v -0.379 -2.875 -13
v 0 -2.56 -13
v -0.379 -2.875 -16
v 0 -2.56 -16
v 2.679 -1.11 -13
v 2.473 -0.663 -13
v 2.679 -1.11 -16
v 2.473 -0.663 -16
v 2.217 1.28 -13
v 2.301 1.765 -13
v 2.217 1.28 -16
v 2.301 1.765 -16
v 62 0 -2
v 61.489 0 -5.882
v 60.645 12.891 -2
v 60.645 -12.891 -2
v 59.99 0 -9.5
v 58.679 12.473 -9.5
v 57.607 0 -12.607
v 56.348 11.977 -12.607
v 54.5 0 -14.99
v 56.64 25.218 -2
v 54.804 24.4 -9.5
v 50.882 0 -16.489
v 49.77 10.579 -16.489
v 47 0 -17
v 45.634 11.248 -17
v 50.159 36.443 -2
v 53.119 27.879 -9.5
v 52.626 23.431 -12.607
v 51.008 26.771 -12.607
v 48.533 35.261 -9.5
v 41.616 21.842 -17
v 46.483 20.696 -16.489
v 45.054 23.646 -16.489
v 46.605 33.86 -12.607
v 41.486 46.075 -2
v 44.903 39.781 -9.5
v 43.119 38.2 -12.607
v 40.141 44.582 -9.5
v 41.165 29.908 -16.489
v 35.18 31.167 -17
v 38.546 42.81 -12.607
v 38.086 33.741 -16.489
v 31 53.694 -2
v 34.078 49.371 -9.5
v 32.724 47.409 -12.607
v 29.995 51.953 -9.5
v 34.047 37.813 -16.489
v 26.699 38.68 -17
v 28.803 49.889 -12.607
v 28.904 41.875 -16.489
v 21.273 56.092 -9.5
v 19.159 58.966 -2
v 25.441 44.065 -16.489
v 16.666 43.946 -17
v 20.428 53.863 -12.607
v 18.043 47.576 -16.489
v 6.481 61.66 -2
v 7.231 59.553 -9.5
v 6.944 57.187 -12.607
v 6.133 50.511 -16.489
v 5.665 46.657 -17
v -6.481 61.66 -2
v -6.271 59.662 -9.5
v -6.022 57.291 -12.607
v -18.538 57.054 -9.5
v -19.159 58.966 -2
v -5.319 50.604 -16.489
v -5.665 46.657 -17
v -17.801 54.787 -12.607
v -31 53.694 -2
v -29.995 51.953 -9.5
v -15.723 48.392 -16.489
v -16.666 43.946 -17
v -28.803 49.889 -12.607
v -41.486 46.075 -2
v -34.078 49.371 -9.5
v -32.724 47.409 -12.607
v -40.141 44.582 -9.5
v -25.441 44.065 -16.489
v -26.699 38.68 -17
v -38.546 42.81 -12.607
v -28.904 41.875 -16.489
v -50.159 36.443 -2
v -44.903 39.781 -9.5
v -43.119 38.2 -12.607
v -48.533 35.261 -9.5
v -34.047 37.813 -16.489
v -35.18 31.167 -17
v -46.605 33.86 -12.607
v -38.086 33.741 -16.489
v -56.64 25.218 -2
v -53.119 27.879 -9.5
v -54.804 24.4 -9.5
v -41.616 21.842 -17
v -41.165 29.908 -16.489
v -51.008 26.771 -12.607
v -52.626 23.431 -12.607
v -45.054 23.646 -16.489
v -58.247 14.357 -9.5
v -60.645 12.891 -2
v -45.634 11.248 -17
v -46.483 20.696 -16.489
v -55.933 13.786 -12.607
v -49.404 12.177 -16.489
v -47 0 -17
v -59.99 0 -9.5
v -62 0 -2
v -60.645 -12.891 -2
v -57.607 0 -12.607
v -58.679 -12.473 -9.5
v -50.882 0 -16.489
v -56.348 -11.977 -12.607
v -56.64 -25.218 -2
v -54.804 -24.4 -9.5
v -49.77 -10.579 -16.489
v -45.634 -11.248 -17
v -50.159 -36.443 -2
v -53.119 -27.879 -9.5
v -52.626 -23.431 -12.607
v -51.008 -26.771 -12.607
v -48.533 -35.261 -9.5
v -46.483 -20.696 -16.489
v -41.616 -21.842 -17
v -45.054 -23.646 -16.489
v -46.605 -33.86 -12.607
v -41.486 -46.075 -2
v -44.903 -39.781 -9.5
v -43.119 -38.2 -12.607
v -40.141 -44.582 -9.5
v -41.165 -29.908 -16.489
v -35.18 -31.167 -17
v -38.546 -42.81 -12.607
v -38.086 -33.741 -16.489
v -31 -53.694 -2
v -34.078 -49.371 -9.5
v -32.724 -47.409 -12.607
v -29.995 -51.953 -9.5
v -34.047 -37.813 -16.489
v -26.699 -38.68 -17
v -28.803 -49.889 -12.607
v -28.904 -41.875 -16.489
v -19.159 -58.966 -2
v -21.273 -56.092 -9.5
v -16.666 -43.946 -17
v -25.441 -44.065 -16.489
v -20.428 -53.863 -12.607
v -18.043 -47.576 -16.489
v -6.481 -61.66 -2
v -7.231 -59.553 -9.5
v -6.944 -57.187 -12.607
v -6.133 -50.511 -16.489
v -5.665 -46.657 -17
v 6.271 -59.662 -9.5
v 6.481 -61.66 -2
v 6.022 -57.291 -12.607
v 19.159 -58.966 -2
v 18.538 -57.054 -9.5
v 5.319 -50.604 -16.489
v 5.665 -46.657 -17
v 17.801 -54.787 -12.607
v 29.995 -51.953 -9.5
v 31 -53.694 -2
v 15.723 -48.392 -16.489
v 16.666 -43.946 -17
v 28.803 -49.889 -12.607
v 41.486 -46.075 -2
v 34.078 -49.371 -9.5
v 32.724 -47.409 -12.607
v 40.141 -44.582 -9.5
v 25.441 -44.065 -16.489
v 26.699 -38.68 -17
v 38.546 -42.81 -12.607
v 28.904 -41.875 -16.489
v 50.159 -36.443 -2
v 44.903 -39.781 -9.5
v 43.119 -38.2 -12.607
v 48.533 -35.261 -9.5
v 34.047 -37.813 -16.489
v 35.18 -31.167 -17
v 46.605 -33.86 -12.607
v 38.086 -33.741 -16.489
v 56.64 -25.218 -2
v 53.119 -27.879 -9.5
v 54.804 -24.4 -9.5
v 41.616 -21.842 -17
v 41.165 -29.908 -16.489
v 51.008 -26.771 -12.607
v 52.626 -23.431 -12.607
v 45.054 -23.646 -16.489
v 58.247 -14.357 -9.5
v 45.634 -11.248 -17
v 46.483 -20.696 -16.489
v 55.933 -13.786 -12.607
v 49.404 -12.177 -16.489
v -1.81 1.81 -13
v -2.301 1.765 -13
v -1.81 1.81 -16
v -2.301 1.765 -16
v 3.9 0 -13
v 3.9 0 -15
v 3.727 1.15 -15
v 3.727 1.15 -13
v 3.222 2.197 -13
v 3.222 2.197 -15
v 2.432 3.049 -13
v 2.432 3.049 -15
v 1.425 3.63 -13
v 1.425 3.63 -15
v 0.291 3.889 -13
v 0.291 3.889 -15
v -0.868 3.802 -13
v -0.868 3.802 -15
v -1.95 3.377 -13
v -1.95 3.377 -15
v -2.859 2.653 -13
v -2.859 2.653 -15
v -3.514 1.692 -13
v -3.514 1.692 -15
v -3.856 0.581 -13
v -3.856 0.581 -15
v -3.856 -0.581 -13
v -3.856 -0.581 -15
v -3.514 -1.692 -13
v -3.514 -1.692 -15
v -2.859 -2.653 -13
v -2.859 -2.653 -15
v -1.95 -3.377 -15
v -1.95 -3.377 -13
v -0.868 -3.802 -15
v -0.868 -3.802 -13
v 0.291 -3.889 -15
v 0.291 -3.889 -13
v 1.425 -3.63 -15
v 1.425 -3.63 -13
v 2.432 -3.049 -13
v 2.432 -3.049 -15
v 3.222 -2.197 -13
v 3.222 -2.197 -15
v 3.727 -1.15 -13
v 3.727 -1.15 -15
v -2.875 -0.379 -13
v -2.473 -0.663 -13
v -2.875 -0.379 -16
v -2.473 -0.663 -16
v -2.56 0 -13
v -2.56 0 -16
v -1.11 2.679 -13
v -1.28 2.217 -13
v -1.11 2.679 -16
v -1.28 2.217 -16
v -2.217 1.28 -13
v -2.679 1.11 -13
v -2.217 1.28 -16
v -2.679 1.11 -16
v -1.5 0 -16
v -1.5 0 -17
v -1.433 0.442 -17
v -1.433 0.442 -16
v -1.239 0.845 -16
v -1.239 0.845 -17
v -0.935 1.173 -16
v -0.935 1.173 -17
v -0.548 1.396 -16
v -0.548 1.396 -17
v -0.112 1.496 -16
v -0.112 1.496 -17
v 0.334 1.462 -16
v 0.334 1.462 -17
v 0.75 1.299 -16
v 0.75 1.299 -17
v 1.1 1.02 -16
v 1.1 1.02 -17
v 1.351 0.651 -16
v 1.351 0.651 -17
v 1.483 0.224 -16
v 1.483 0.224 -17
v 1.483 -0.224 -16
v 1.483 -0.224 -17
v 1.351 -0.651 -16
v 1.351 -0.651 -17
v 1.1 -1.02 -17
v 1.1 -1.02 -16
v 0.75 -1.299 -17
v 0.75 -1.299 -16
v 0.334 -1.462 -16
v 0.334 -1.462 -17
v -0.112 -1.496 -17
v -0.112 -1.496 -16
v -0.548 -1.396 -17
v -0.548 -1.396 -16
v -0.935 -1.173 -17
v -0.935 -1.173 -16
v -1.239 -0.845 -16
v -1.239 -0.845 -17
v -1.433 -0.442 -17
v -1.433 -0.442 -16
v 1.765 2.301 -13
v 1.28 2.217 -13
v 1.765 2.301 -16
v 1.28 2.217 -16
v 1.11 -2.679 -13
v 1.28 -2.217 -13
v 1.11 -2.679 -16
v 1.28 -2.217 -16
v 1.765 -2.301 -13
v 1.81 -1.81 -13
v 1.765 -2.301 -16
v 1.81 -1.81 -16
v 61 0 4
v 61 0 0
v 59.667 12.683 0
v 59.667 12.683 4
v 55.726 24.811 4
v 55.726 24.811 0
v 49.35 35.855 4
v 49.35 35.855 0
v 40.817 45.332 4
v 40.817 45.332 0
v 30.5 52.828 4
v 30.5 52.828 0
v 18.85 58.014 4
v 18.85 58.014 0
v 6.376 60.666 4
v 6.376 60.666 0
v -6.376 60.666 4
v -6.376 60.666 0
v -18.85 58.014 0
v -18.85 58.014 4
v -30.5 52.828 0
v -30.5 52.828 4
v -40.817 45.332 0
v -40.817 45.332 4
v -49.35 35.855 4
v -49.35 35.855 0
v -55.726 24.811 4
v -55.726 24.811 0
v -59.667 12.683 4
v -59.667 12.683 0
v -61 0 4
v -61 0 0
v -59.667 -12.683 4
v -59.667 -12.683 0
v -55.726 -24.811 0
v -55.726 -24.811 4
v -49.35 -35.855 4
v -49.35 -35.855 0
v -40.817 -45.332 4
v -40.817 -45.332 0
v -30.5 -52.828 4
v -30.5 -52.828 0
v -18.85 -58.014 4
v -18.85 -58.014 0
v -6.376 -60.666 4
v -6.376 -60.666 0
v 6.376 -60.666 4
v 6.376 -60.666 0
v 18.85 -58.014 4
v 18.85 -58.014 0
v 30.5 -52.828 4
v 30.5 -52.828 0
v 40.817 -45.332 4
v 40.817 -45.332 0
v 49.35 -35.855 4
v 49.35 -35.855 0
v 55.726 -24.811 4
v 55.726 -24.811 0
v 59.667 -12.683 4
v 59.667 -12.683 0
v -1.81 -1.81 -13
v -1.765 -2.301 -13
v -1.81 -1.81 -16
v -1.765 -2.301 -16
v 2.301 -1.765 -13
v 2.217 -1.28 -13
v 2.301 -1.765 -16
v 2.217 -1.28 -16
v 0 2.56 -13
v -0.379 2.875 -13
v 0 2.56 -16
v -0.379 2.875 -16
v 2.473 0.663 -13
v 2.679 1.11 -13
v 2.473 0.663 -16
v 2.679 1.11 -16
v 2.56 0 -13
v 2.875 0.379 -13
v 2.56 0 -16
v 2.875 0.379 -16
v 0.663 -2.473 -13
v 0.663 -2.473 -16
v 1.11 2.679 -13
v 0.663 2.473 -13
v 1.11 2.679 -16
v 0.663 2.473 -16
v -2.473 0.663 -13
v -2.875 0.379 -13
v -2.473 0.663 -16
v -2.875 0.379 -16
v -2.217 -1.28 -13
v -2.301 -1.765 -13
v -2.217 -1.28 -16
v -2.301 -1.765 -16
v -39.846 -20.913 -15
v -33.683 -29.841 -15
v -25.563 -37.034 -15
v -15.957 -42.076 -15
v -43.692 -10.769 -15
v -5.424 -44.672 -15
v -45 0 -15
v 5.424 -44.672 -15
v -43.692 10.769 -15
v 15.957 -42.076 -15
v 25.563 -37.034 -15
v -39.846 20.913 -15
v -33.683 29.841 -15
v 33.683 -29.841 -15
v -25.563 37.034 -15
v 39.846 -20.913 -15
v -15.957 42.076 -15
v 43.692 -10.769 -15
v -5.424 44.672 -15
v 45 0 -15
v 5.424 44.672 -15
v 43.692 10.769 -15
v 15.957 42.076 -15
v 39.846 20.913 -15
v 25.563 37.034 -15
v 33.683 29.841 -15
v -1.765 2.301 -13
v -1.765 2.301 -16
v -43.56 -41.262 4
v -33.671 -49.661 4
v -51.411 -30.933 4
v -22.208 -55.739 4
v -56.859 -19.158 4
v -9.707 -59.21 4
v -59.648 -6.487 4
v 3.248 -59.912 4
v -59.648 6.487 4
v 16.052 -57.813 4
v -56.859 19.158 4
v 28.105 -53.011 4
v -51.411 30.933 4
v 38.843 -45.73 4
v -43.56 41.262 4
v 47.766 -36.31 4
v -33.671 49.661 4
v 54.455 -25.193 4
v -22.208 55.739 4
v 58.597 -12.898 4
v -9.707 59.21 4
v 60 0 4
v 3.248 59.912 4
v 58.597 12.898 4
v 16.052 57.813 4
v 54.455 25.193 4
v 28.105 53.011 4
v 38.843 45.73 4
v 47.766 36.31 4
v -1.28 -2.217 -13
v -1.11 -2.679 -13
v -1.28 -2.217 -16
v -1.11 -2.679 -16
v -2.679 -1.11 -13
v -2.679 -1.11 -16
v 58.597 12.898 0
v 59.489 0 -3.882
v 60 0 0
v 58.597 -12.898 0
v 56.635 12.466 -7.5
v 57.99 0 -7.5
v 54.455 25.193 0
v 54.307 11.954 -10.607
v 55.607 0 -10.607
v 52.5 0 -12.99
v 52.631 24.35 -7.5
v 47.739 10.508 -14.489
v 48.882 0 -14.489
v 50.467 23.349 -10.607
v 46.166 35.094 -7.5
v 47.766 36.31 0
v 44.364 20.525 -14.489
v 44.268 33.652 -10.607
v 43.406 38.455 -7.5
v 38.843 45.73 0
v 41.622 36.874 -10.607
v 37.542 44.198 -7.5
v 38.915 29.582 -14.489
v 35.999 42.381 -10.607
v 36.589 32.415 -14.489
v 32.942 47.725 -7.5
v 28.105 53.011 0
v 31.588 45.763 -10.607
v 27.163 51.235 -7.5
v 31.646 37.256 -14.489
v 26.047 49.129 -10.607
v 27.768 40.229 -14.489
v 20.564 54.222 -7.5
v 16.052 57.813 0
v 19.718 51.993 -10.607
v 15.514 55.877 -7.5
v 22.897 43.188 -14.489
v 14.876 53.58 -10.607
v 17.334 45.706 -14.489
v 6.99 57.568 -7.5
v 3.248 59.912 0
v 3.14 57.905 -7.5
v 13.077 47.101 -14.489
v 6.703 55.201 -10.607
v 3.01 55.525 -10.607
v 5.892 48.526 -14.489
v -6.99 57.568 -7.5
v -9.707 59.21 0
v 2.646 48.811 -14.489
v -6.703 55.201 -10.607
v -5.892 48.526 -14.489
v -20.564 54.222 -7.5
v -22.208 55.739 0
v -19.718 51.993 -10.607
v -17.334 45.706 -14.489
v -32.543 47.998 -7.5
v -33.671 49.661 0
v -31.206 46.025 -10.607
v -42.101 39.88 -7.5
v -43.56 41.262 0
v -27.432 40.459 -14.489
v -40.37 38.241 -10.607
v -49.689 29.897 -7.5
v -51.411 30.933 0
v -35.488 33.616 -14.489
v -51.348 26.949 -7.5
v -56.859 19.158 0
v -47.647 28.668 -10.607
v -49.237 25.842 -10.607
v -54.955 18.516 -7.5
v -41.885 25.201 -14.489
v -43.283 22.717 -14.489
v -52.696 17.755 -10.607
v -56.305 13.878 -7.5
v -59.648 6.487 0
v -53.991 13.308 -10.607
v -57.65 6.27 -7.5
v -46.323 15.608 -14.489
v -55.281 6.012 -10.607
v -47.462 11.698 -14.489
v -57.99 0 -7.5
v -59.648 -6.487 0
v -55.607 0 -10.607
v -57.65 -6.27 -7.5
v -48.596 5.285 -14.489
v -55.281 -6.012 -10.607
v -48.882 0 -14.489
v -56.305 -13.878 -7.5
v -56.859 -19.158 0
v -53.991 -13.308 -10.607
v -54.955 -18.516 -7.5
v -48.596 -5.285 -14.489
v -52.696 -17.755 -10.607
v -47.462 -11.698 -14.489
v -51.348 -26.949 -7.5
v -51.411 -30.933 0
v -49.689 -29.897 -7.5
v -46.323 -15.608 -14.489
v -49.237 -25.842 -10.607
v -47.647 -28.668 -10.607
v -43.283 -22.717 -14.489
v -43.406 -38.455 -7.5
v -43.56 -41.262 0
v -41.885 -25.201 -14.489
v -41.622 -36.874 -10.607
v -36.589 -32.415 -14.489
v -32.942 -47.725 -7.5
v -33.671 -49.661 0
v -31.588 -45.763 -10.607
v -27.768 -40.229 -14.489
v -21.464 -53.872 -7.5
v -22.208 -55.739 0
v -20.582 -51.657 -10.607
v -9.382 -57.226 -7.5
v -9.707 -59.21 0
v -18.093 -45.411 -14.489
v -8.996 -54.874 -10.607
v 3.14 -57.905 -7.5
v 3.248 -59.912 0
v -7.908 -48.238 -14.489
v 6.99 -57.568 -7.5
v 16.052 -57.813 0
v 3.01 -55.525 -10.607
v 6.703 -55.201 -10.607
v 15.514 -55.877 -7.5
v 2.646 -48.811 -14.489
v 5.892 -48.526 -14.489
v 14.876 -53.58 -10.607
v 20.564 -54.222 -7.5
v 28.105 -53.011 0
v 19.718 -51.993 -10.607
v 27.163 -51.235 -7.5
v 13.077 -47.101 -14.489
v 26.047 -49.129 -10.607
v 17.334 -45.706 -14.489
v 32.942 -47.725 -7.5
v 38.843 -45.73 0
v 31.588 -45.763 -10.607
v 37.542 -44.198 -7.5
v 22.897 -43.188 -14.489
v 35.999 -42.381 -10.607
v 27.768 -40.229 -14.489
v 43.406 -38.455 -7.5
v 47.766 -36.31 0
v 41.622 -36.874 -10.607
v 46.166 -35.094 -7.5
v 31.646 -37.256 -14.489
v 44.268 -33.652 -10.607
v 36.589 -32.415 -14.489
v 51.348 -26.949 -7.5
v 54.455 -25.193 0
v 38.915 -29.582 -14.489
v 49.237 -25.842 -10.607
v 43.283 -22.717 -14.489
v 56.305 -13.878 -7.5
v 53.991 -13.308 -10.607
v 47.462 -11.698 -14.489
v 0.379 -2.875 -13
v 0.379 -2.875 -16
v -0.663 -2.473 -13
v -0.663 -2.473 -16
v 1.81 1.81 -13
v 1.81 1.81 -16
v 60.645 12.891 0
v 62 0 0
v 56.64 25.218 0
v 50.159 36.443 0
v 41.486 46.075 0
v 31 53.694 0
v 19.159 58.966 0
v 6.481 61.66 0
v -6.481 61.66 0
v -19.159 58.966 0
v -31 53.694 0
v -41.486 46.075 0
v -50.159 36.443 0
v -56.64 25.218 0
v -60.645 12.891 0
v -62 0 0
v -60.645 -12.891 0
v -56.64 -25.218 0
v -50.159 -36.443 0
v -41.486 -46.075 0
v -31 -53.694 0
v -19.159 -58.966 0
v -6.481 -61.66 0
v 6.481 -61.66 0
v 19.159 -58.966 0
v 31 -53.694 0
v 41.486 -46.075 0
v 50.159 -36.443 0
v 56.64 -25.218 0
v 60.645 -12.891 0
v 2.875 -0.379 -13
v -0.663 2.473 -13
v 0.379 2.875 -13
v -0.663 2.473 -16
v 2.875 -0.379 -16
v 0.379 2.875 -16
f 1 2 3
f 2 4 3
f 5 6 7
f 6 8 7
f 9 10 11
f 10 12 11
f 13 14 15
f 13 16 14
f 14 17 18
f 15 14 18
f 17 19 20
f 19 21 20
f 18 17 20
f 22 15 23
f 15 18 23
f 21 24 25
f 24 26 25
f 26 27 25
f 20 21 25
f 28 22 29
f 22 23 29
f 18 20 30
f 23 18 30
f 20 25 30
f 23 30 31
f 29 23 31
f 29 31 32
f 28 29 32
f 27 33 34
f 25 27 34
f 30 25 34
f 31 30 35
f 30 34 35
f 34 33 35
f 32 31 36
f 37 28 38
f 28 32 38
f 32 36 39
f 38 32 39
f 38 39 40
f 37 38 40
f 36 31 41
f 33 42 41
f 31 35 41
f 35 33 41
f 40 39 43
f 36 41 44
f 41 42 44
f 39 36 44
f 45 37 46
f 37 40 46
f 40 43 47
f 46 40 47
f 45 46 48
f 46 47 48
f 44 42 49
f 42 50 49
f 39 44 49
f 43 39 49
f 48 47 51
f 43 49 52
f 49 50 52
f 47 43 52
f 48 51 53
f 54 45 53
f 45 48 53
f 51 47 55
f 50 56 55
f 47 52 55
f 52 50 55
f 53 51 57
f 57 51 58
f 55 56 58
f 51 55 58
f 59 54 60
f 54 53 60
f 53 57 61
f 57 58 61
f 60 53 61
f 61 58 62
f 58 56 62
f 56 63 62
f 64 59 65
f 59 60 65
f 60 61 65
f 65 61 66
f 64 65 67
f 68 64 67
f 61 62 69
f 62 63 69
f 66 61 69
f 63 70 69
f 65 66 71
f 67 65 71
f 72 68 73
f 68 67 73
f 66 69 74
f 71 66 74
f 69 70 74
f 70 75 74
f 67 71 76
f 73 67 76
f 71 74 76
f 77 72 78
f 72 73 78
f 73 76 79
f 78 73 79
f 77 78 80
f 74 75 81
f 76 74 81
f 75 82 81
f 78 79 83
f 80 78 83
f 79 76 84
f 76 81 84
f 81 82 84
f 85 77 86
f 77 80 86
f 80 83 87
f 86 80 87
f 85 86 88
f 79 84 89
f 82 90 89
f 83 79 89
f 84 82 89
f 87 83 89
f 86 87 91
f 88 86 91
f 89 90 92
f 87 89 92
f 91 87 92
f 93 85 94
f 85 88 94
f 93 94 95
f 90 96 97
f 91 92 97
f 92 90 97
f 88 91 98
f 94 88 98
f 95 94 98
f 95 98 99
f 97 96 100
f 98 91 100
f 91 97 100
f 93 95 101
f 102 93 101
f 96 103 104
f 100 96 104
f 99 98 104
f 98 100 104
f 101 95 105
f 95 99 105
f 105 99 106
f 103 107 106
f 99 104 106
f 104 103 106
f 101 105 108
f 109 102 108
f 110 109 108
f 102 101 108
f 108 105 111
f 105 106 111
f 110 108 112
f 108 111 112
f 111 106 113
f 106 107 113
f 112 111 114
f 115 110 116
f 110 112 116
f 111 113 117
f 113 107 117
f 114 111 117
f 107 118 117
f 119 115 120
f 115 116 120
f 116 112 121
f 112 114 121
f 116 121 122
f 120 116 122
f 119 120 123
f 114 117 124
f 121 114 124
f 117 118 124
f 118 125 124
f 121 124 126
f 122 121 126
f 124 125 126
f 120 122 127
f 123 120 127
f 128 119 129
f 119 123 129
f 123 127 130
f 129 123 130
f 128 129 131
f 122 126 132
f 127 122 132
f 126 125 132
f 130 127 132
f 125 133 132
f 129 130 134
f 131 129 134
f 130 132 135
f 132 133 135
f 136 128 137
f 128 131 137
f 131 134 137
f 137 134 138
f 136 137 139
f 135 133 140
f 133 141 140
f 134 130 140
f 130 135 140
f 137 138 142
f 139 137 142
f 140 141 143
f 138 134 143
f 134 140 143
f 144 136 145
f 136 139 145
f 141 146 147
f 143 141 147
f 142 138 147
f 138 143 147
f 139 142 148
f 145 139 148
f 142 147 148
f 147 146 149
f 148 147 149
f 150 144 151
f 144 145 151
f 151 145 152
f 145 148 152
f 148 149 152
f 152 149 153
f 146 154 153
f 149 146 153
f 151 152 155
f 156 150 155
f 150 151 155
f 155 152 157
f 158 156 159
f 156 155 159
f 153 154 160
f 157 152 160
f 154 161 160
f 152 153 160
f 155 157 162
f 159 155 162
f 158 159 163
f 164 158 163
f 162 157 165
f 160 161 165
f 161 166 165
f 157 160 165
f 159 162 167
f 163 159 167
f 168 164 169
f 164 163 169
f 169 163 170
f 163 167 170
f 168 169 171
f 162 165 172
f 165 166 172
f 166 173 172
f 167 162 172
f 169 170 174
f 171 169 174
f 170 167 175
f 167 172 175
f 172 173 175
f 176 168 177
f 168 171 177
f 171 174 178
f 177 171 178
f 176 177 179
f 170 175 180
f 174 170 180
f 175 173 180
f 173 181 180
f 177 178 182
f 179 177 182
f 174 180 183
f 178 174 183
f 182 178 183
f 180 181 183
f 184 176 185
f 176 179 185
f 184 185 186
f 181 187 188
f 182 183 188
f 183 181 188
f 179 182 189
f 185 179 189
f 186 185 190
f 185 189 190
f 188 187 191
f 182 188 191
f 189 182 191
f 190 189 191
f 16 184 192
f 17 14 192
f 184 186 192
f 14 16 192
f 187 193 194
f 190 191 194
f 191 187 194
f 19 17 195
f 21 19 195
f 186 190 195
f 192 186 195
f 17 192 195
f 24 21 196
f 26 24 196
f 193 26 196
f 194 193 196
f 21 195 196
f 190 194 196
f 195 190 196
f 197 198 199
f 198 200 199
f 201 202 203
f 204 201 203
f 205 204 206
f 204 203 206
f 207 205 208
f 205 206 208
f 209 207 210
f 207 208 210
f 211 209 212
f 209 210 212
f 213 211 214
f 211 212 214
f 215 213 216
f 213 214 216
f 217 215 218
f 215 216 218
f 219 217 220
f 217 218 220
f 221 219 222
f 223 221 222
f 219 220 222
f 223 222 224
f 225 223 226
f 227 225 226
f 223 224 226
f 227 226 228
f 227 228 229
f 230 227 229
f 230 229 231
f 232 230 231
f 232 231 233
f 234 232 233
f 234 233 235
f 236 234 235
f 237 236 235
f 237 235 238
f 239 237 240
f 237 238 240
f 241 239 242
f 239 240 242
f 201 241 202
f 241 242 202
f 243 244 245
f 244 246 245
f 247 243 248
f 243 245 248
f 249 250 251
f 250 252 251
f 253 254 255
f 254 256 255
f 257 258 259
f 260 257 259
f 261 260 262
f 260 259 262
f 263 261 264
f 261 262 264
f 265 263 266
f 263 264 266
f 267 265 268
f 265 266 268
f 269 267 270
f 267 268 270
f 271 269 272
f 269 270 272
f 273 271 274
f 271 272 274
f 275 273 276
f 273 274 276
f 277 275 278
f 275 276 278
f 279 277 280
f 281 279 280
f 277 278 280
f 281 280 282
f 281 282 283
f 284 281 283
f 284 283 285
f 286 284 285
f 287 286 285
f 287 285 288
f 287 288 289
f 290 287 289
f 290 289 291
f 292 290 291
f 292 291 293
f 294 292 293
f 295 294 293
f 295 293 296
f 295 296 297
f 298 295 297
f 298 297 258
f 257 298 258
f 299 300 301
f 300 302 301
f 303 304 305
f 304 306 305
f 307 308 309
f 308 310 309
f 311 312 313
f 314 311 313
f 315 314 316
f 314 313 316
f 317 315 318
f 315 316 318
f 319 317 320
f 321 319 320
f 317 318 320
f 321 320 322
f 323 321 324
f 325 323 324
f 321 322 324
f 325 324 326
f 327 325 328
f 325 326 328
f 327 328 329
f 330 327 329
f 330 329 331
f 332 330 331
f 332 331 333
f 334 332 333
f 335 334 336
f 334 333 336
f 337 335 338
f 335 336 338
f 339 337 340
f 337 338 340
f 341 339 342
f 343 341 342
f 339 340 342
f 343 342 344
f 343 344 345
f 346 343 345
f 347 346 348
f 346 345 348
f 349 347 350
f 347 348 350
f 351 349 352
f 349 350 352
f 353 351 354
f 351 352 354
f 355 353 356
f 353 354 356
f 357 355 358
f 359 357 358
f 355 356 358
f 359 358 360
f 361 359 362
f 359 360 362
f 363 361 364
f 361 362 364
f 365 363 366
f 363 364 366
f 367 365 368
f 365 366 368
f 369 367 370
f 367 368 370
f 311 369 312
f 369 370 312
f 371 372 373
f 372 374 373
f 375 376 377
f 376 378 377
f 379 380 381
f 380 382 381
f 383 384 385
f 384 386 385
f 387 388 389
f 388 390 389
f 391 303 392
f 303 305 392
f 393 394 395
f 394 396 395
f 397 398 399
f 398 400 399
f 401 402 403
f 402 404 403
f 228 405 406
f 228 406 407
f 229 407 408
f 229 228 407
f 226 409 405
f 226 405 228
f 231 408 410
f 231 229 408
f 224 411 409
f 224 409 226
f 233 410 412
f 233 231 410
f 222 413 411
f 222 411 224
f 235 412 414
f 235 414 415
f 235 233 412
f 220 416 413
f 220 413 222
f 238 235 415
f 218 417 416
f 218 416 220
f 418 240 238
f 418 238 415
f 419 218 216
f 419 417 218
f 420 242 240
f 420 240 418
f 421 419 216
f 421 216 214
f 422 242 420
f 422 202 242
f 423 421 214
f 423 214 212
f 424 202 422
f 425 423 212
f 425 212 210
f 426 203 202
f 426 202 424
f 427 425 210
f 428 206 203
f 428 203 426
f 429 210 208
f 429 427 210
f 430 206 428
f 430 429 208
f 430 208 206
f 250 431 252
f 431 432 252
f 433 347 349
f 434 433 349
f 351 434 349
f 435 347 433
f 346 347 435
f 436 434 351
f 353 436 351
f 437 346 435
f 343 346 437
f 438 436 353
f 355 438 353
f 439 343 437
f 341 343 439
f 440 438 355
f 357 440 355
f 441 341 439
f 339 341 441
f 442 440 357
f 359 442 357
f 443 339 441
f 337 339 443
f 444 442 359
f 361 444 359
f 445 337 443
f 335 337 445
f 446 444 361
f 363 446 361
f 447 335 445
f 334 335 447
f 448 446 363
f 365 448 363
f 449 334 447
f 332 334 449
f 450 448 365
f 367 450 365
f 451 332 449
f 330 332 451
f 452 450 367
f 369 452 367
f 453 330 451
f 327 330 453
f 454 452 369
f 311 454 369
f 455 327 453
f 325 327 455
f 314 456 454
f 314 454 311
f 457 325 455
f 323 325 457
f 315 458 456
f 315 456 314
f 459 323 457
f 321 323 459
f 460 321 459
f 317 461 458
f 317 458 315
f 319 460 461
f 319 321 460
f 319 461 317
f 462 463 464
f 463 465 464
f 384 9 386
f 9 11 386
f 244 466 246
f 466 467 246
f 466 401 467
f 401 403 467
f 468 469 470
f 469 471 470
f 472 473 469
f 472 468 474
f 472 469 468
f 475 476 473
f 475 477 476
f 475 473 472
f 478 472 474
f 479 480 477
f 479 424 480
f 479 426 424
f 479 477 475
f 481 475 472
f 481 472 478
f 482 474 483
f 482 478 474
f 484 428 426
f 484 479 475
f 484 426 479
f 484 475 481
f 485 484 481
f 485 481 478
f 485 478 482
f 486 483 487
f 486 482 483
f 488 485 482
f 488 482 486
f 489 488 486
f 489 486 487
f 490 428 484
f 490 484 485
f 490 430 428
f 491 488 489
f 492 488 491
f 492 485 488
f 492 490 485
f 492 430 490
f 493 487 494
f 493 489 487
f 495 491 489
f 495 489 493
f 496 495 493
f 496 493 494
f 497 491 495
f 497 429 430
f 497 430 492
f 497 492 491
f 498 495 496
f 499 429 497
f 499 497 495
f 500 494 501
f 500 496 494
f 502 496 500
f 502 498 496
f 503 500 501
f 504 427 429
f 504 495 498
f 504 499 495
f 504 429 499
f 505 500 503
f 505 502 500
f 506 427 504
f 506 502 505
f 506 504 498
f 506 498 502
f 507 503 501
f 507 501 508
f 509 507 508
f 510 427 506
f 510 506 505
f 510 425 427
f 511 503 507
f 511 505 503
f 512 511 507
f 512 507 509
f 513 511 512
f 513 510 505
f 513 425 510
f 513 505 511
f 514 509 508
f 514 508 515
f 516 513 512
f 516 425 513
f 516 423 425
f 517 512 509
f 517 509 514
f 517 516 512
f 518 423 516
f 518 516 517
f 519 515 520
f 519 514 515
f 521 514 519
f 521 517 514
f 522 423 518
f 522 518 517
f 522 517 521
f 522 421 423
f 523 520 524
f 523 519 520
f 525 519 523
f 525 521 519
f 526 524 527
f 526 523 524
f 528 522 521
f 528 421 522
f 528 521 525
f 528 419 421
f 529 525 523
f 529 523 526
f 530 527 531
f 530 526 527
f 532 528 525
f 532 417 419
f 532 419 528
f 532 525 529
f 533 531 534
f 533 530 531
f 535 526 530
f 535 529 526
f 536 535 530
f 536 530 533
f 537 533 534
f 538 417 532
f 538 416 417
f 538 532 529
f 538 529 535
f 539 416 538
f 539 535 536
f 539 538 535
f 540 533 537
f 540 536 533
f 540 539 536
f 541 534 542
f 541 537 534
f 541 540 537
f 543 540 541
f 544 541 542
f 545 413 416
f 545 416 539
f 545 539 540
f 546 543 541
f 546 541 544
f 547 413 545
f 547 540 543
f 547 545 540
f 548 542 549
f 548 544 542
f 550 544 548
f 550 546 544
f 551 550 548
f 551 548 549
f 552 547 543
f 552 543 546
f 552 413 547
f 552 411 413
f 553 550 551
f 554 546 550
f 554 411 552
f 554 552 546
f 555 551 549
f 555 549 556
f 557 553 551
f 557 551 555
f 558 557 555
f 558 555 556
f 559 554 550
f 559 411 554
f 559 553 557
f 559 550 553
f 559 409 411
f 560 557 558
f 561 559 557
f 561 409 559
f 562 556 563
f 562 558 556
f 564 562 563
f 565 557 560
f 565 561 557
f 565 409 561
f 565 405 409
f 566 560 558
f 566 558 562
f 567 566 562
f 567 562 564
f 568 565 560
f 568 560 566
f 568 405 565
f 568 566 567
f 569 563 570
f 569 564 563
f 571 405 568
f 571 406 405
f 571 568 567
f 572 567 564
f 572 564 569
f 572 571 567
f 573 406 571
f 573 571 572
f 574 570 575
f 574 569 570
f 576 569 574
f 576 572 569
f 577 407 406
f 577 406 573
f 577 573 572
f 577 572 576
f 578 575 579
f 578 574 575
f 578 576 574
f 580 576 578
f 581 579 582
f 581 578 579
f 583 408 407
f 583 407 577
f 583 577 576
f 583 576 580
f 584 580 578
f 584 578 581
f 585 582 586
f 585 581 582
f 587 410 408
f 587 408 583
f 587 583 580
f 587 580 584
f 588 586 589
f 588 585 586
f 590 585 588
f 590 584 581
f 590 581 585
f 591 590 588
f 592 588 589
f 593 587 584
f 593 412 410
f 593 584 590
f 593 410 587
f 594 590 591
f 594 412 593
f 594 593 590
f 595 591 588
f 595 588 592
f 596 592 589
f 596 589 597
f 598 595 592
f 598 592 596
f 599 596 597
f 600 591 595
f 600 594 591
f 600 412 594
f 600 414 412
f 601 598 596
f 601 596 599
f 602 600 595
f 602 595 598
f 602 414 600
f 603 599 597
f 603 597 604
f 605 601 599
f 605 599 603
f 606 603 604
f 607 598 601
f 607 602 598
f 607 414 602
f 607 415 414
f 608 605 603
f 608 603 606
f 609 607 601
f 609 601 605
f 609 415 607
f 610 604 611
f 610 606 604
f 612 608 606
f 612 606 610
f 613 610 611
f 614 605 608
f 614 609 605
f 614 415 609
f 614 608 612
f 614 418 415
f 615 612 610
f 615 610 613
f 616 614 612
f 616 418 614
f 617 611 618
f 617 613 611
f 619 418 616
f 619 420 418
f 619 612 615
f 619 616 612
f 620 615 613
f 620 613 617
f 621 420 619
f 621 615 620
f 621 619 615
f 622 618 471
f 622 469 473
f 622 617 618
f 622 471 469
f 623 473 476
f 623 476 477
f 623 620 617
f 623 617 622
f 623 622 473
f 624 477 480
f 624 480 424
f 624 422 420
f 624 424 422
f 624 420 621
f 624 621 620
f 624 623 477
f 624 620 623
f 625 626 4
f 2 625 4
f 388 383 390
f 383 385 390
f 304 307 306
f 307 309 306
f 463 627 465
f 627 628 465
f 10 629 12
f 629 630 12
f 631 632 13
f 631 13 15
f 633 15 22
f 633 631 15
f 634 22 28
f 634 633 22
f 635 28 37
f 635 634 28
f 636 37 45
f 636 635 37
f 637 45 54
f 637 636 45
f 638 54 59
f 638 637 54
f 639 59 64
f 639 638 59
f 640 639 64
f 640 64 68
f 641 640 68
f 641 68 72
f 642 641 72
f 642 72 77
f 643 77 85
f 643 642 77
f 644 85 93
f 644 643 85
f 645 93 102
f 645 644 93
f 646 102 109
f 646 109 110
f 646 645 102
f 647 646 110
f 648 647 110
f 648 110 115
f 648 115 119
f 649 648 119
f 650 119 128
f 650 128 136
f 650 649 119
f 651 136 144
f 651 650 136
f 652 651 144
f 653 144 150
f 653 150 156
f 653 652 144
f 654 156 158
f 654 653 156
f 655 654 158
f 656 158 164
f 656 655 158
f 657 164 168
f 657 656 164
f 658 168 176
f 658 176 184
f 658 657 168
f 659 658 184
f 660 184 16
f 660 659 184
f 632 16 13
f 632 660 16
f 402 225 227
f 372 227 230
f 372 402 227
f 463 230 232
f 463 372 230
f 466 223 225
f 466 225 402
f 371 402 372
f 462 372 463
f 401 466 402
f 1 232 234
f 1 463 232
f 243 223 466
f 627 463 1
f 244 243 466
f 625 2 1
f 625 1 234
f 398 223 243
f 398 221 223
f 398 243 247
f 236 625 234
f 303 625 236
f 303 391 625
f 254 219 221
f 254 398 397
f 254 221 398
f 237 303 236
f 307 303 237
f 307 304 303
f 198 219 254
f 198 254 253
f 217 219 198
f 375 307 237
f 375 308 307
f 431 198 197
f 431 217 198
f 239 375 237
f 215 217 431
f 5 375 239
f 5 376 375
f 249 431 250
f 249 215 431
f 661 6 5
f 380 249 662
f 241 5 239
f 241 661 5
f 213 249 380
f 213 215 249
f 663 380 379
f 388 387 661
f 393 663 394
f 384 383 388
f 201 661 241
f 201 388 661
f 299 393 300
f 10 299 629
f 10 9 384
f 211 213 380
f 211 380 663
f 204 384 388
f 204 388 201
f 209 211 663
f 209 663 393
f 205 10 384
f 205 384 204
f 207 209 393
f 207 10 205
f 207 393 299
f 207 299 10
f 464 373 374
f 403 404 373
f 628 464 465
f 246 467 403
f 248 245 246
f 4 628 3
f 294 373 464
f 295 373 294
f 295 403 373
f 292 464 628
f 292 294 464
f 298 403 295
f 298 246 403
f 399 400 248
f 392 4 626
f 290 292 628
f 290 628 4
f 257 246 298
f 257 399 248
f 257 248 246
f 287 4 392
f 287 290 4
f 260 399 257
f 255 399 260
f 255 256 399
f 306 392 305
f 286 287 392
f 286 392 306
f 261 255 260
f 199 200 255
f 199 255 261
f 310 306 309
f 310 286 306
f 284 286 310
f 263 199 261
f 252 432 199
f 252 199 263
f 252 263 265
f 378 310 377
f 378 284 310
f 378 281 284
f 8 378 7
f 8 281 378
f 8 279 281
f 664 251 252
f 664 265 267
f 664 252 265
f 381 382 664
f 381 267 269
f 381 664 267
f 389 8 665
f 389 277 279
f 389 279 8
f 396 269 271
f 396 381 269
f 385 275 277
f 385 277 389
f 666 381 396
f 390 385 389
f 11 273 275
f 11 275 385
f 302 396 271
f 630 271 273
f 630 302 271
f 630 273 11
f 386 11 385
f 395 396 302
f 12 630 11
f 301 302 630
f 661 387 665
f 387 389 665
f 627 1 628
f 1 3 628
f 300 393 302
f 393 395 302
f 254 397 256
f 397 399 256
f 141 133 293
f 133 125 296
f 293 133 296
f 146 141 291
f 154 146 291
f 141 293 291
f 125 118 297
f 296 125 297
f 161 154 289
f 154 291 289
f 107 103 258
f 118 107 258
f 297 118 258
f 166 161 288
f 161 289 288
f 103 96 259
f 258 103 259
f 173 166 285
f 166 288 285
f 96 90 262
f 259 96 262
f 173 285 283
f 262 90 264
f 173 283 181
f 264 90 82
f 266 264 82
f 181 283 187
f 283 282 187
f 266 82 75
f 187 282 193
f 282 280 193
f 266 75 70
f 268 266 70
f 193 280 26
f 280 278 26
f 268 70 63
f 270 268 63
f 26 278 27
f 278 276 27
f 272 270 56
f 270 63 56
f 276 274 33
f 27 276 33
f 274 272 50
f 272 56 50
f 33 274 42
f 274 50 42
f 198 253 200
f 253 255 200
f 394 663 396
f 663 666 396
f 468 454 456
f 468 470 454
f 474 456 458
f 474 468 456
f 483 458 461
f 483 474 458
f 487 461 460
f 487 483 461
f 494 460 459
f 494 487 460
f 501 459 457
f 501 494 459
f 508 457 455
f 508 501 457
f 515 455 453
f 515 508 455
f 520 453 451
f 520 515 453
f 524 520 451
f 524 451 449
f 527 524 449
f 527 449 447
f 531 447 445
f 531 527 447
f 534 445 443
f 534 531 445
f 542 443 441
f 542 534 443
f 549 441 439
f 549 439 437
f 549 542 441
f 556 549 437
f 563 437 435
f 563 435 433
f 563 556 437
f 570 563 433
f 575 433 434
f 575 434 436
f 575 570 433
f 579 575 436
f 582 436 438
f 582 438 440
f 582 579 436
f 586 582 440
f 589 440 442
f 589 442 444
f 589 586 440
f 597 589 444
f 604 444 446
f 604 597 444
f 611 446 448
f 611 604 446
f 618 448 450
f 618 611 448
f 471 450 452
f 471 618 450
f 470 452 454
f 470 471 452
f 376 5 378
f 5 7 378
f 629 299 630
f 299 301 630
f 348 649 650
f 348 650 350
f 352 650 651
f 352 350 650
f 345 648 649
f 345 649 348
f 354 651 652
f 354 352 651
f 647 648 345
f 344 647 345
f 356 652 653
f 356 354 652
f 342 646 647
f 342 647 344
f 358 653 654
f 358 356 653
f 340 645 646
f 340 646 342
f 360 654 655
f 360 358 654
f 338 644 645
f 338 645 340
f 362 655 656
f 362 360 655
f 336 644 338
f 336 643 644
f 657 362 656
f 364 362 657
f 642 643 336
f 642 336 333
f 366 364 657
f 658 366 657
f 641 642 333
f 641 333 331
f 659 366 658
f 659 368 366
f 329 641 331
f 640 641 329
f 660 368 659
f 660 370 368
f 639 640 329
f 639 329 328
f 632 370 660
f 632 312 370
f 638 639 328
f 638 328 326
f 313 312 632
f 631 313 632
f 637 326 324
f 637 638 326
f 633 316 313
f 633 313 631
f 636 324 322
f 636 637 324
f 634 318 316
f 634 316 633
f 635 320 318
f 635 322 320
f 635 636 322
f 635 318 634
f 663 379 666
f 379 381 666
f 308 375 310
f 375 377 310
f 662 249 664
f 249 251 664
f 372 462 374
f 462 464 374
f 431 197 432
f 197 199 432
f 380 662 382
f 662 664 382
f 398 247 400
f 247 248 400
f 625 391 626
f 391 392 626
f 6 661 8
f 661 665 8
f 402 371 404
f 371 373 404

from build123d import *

# Parameters (mm, degrees)
F0_R     = 62
F1_DEPTH = 17
F2_R     = 60
F3_DEPTH = 15
F4_R     = 14.99999
F5_R     = 61
F5_R_2   = 60
F6_DEPTH = 4
F7_R     = 3.9
F8_DEPTH = 2
F9_DEPTH = 1
F10_D    = 3


# Not quite as in the source:
# - a fillet or chamfer is up to 0.001 mm smaller than in the source, because OpenCascade refuses the exact size


with BuildPart() as f1:
    # F0 (on Top) → F1 (new body)
    with BuildSketch(Plane.XY):
        Circle(F0_R)
    extrude(amount=-F1_DEPTH)

    # F2 (on face) → F3 (cut)
    with BuildSketch(Plane.XY):
        Circle(F2_R)
    extrude(amount=-F3_DEPTH, mode=Mode.SUBTRACT)

    # F4 (radius 15 in the source; OpenCascade refuses exactly that, so slightly less here)
    f4_edges = [f1.edges().sort_by_distance(p)[0] for p in [
        (-60, 0, -15),
        (-62, 0, -17),
    ]]
    fillet(f4_edges, radius=F4_R)

    # F5 (on face) → F6 (join)
    with BuildSketch(Plane.XY):
        Circle(F5_R)
        Circle(F5_R_2, mode=Mode.SUBTRACT)
    extrude(amount=F6_DEPTH)

    # F7 (on face) → F8 (join)
    with BuildSketch(Plane.XY.offset(-15)):
        Circle(F7_R)
        with BuildLine():
            ThreePointArc((2.6792506443, 1.1097819539), (2.8011848962, 0.7505752308), (2.875190098, 0.3785259574))
            ThreePointArc((2.875190098, 0.3785259574), (2.8937908774, 0.1896690748), (2.9, 0))
            ThreePointArc((2.9, 0), (2.8937908774, -0.1896690748), (2.875190098, -0.3785259574))
            ThreePointArc((2.875190098, -0.3785259574), (2.8011848962, -0.7505752308), (2.6792506443, -1.1097819539))
            ThreePointArc((2.6792506443, -1.1097819539), (2.511473671, -1.45), (2.3007246868, -1.7654081441))
            ThreePointArc((2.3007246868, -1.7654081441), (2.0506096654, -2.0506096654), (1.7654081441, -2.3007246868))
            ThreePointArc((1.7654081441, -2.3007246868), (1.45, -2.511473671), (1.1097819539, -2.6792506443))
            ThreePointArc((1.1097819539, -2.6792506443), (0.7505752308, -2.8011848962), (0.3785259574, -2.875190098))
            ThreePointArc((0.3785259574, -2.875190098), (0, -2.9), (-0.3785259574, -2.875190098))
            ThreePointArc((-0.3785259574, -2.875190098), (-0.7505752308, -2.8011848962), (-1.1097819539, -2.6792506443))
            ThreePointArc((-1.1097819539, -2.6792506443), (-1.45, -2.511473671), (-1.7654081441, -2.3007246868))
            ThreePointArc((-1.7654081441, -2.3007246868), (-2.0506096654, -2.0506096654), (-2.3007246868, -1.7654081441))
            ThreePointArc((-2.3007246868, -1.7654081441), (-2.511473671, -1.45), (-2.6792506443, -1.1097819539))
            ThreePointArc((-2.6792506443, -1.1097819539), (-2.8011848962, -0.7505752308), (-2.875190098, -0.3785259574))
            ThreePointArc((-2.875190098, -0.3785259574), (-2.9, 0), (-2.875190098, 0.3785259574))
            ThreePointArc((-2.875190098, 0.3785259574), (-2.8011848962, 0.7505752308), (-2.6792506443, 1.1097819539))
            ThreePointArc((-2.6792506443, 1.1097819539), (-2.511473671, 1.45), (-2.3007246868, 1.7654081441))
            ThreePointArc((-2.3007246868, 1.7654081441), (-2.0506096654, 2.0506096654), (-1.7654081441, 2.3007246868))
            ThreePointArc((-1.7654081441, 2.3007246868), (-1.45, 2.511473671), (-1.1097819539, 2.6792506443))
            ThreePointArc((-1.1097819539, 2.6792506443), (-0.7505752308, 2.8011848962), (-0.3785259574, 2.875190098))
            ThreePointArc((-0.3785259574, 2.875190098), (0, 2.9), (0.3785259574, 2.875190098))
            ThreePointArc((0.3785259574, 2.875190098), (0.7505752308, 2.8011848962), (1.1097819539, 2.6792506443))
            ThreePointArc((1.1097819539, 2.6792506443), (1.45, 2.511473671), (1.7654081441, 2.3007246868))
            ThreePointArc((1.7654081441, 2.3007246868), (2.0506096654, 2.0506096654), (2.3007246868, 1.7654081441))
            ThreePointArc((2.3007246868, 1.7654081441), (2.511473671, 1.45), (2.6792506443, 1.1097819539))
        make_face(mode=Mode.SUBTRACT)
        with BuildLine():
            Line((-2.6792506443, 1.1097819539), (-2.2170250337, 1.28))
            Line((-2.2170250337, 1.28), (-2.3007246868, 1.7654081441))
            ThreePointArc((-2.3007246868, 1.7654081441), (-2.511473671, 1.45), (-2.6792506443, 1.1097819539))
        make_face()
        with BuildLine():
            Line((-2.3007246868, 1.7654081441), (-1.8101933598, 1.8101933598))
            Line((-1.8101933598, 1.8101933598), (-1.7654081441, 2.3007246868))
            ThreePointArc((-1.7654081441, 2.3007246868), (-2.0506096654, 2.0506096654), (-2.3007246868, 1.7654081441))
        make_face()
        with BuildLine():
            Line((-1.7654081441, 2.3007246868), (-1.28, 2.2170250337))
            Line((-1.28, 2.2170250337), (-1.1097819539, 2.6792506443))
            ThreePointArc((-1.1097819539, 2.6792506443), (-1.45, 2.511473671), (-1.7654081441, 2.3007246868))
        make_face()
        with BuildLine():
            Line((-1.1097819539, 2.6792506443), (-0.6625767555, 2.4727701153))
            Line((-0.6625767555, 2.4727701153), (-0.3785259574, 2.875190098))
            ThreePointArc((-0.3785259574, 2.875190098), (-0.7505752308, 2.8011848962), (-1.1097819539, 2.6792506443))
        make_face()
        with BuildLine():
            Line((-0.3785259574, 2.875190098), (0, 2.56))
            Line((0, 2.56), (0.3785259574, 2.875190098))
            ThreePointArc((0.3785259574, 2.875190098), (0, 2.9), (-0.3785259574, 2.875190098))
        make_face()
        with BuildLine():
            Line((0.3785259574, 2.875190098), (0.6625767555, 2.4727701153))
            Line((0.6625767555, 2.4727701153), (1.1097819539, 2.6792506443))
            ThreePointArc((1.1097819539, 2.6792506443), (0.7505752308, 2.8011848962), (0.3785259574, 2.875190098))
        make_face()
        with BuildLine():
            Line((1.1097819539, 2.6792506443), (1.28, 2.2170250337))
            Line((1.28, 2.2170250337), (1.7654081441, 2.3007246868))
            ThreePointArc((1.7654081441, 2.3007246868), (1.45, 2.511473671), (1.1097819539, 2.6792506443))
        make_face()
        with BuildLine():
            Line((1.7654081441, 2.3007246868), (1.8101933598, 1.8101933598))
            Line((1.8101933598, 1.8101933598), (2.3007246868, 1.7654081441))
            ThreePointArc((2.3007246868, 1.7654081441), (2.0506096654, 2.0506096654), (1.7654081441, 2.3007246868))
        make_face()
        with BuildLine():
            Line((2.3007246868, 1.7654081441), (2.2170250337, 1.28))
            Line((2.2170250337, 1.28), (2.6792506443, 1.1097819539))
            ThreePointArc((2.6792506443, 1.1097819539), (2.511473671, 1.45), (2.3007246868, 1.7654081441))
        make_face()
        with BuildLine():
            Line((2.6792506443, 1.1097819539), (2.4727701153, 0.6625767555))
            Line((2.4727701153, 0.6625767555), (2.875190098, 0.3785259574))
            ThreePointArc((2.875190098, 0.3785259574), (2.8011848962, 0.7505752308), (2.6792506443, 1.1097819539))
        make_face()
        with BuildLine():
            ThreePointArc((2.9, 0), (2.8937908774, 0.1896690748), (2.875190098, 0.3785259574))
            Line((2.875190098, 0.3785259574), (2.56, 0))
            Line((2.56, 0), (2.875190098, -0.3785259574))
            ThreePointArc((2.875190098, -0.3785259574), (2.8937908774, -0.1896690748), (2.9, 0))
        make_face()
        with BuildLine():
            Line((2.875190098, -0.3785259574), (2.4727701153, -0.6625767555))
            Line((2.4727701153, -0.6625767555), (2.6792506443, -1.1097819539))
            ThreePointArc((2.6792506443, -1.1097819539), (2.8011848962, -0.7505752308), (2.875190098, -0.3785259574))
        make_face()
        with BuildLine():
            Line((2.6792506443, -1.1097819539), (2.2170250337, -1.28))
            Line((2.2170250337, -1.28), (2.3007246868, -1.7654081441))
            ThreePointArc((2.3007246868, -1.7654081441), (2.511473671, -1.45), (2.6792506443, -1.1097819539))
        make_face()
        with BuildLine():
            Line((2.3007246868, -1.7654081441), (1.8101933598, -1.8101933598))
            Line((1.8101933598, -1.8101933598), (1.7654081441, -2.3007246868))
            ThreePointArc((1.7654081441, -2.3007246868), (2.0506096654, -2.0506096654), (2.3007246868, -1.7654081441))
        make_face()
        with BuildLine():
            Line((1.7654081441, -2.3007246868), (1.28, -2.2170250337))
            Line((1.28, -2.2170250337), (1.1097819539, -2.6792506443))
            ThreePointArc((1.1097819539, -2.6792506443), (1.45, -2.511473671), (1.7654081441, -2.3007246868))
        make_face()
        with BuildLine():
            Line((-2.875190098, 0.3785259574), (-2.4727701153, 0.6625767555))
            Line((-2.4727701153, 0.6625767555), (-2.6792506443, 1.1097819539))
            ThreePointArc((-2.6792506443, 1.1097819539), (-2.8011848962, 0.7505752308), (-2.875190098, 0.3785259574))
        make_face()
        with BuildLine():
            Line((-2.875190098, -0.3785259574), (-2.56, 0))
            Line((-2.56, 0), (-2.875190098, 0.3785259574))
            ThreePointArc((-2.875190098, 0.3785259574), (-2.9, 0), (-2.875190098, -0.3785259574))
        make_face()
        with BuildLine():
            Line((-2.6792506443, -1.1097819539), (-2.4727701153, -0.6625767555))
            Line((-2.4727701153, -0.6625767555), (-2.875190098, -0.3785259574))
            ThreePointArc((-2.875190098, -0.3785259574), (-2.8011848962, -0.7505752308), (-2.6792506443, -1.1097819539))
        make_face()
        with BuildLine():
            Line((-2.3007246868, -1.7654081441), (-2.2170250337, -1.28))
            Line((-2.2170250337, -1.28), (-2.6792506443, -1.1097819539))
            ThreePointArc((-2.6792506443, -1.1097819539), (-2.511473671, -1.45), (-2.3007246868, -1.7654081441))
        make_face()
        with BuildLine():
            Line((-1.7654081441, -2.3007246868), (-1.8101933598, -1.8101933598))
            Line((-1.8101933598, -1.8101933598), (-2.3007246868, -1.7654081441))
            ThreePointArc((-2.3007246868, -1.7654081441), (-2.0506096654, -2.0506096654), (-1.7654081441, -2.3007246868))
        make_face()
        with BuildLine():
            Line((-1.1097819539, -2.6792506443), (-1.28, -2.2170250337))
            Line((-1.28, -2.2170250337), (-1.7654081441, -2.3007246868))
            ThreePointArc((-1.7654081441, -2.3007246868), (-1.45, -2.511473671), (-1.1097819539, -2.6792506443))
        make_face()
        with BuildLine():
            Line((-0.3785259574, -2.875190098), (-0.6625767555, -2.4727701153))
            Line((-0.6625767555, -2.4727701153), (-1.1097819539, -2.6792506443))
            ThreePointArc((-1.1097819539, -2.6792506443), (-0.7505752308, -2.8011848962), (-0.3785259574, -2.875190098))
        make_face()
        with BuildLine():
            Line((0.3785259574, -2.875190098), (0, -2.56))
            Line((0, -2.56), (-0.3785259574, -2.875190098))
            ThreePointArc((-0.3785259574, -2.875190098), (0, -2.9), (0.3785259574, -2.875190098))
        make_face()
        with BuildLine():
            Line((1.1097819539, -2.6792506443), (0.6625767555, -2.4727701153))
            Line((0.6625767555, -2.4727701153), (0.3785259574, -2.875190098))
            ThreePointArc((0.3785259574, -2.875190098), (0.7505752308, -2.8011848962), (1.1097819539, -2.6792506443))
        make_face()
    extrude(amount=F8_DEPTH)

    # F9 (cut): a face of the model
    f9_faces = [f1.faces().sort_by_distance(p)[0] for p in [
        (0, 0, -15),
    ]]
    extrude(f9_faces, amount=-F9_DEPTH, mode=Mode.SUBTRACT)

    # F10 (through all)
    with Locations(Plane.XY.offset(-15)):
        with Locations((0, 0)):
            Hole(F10_D / 2)


solid = f1.part
